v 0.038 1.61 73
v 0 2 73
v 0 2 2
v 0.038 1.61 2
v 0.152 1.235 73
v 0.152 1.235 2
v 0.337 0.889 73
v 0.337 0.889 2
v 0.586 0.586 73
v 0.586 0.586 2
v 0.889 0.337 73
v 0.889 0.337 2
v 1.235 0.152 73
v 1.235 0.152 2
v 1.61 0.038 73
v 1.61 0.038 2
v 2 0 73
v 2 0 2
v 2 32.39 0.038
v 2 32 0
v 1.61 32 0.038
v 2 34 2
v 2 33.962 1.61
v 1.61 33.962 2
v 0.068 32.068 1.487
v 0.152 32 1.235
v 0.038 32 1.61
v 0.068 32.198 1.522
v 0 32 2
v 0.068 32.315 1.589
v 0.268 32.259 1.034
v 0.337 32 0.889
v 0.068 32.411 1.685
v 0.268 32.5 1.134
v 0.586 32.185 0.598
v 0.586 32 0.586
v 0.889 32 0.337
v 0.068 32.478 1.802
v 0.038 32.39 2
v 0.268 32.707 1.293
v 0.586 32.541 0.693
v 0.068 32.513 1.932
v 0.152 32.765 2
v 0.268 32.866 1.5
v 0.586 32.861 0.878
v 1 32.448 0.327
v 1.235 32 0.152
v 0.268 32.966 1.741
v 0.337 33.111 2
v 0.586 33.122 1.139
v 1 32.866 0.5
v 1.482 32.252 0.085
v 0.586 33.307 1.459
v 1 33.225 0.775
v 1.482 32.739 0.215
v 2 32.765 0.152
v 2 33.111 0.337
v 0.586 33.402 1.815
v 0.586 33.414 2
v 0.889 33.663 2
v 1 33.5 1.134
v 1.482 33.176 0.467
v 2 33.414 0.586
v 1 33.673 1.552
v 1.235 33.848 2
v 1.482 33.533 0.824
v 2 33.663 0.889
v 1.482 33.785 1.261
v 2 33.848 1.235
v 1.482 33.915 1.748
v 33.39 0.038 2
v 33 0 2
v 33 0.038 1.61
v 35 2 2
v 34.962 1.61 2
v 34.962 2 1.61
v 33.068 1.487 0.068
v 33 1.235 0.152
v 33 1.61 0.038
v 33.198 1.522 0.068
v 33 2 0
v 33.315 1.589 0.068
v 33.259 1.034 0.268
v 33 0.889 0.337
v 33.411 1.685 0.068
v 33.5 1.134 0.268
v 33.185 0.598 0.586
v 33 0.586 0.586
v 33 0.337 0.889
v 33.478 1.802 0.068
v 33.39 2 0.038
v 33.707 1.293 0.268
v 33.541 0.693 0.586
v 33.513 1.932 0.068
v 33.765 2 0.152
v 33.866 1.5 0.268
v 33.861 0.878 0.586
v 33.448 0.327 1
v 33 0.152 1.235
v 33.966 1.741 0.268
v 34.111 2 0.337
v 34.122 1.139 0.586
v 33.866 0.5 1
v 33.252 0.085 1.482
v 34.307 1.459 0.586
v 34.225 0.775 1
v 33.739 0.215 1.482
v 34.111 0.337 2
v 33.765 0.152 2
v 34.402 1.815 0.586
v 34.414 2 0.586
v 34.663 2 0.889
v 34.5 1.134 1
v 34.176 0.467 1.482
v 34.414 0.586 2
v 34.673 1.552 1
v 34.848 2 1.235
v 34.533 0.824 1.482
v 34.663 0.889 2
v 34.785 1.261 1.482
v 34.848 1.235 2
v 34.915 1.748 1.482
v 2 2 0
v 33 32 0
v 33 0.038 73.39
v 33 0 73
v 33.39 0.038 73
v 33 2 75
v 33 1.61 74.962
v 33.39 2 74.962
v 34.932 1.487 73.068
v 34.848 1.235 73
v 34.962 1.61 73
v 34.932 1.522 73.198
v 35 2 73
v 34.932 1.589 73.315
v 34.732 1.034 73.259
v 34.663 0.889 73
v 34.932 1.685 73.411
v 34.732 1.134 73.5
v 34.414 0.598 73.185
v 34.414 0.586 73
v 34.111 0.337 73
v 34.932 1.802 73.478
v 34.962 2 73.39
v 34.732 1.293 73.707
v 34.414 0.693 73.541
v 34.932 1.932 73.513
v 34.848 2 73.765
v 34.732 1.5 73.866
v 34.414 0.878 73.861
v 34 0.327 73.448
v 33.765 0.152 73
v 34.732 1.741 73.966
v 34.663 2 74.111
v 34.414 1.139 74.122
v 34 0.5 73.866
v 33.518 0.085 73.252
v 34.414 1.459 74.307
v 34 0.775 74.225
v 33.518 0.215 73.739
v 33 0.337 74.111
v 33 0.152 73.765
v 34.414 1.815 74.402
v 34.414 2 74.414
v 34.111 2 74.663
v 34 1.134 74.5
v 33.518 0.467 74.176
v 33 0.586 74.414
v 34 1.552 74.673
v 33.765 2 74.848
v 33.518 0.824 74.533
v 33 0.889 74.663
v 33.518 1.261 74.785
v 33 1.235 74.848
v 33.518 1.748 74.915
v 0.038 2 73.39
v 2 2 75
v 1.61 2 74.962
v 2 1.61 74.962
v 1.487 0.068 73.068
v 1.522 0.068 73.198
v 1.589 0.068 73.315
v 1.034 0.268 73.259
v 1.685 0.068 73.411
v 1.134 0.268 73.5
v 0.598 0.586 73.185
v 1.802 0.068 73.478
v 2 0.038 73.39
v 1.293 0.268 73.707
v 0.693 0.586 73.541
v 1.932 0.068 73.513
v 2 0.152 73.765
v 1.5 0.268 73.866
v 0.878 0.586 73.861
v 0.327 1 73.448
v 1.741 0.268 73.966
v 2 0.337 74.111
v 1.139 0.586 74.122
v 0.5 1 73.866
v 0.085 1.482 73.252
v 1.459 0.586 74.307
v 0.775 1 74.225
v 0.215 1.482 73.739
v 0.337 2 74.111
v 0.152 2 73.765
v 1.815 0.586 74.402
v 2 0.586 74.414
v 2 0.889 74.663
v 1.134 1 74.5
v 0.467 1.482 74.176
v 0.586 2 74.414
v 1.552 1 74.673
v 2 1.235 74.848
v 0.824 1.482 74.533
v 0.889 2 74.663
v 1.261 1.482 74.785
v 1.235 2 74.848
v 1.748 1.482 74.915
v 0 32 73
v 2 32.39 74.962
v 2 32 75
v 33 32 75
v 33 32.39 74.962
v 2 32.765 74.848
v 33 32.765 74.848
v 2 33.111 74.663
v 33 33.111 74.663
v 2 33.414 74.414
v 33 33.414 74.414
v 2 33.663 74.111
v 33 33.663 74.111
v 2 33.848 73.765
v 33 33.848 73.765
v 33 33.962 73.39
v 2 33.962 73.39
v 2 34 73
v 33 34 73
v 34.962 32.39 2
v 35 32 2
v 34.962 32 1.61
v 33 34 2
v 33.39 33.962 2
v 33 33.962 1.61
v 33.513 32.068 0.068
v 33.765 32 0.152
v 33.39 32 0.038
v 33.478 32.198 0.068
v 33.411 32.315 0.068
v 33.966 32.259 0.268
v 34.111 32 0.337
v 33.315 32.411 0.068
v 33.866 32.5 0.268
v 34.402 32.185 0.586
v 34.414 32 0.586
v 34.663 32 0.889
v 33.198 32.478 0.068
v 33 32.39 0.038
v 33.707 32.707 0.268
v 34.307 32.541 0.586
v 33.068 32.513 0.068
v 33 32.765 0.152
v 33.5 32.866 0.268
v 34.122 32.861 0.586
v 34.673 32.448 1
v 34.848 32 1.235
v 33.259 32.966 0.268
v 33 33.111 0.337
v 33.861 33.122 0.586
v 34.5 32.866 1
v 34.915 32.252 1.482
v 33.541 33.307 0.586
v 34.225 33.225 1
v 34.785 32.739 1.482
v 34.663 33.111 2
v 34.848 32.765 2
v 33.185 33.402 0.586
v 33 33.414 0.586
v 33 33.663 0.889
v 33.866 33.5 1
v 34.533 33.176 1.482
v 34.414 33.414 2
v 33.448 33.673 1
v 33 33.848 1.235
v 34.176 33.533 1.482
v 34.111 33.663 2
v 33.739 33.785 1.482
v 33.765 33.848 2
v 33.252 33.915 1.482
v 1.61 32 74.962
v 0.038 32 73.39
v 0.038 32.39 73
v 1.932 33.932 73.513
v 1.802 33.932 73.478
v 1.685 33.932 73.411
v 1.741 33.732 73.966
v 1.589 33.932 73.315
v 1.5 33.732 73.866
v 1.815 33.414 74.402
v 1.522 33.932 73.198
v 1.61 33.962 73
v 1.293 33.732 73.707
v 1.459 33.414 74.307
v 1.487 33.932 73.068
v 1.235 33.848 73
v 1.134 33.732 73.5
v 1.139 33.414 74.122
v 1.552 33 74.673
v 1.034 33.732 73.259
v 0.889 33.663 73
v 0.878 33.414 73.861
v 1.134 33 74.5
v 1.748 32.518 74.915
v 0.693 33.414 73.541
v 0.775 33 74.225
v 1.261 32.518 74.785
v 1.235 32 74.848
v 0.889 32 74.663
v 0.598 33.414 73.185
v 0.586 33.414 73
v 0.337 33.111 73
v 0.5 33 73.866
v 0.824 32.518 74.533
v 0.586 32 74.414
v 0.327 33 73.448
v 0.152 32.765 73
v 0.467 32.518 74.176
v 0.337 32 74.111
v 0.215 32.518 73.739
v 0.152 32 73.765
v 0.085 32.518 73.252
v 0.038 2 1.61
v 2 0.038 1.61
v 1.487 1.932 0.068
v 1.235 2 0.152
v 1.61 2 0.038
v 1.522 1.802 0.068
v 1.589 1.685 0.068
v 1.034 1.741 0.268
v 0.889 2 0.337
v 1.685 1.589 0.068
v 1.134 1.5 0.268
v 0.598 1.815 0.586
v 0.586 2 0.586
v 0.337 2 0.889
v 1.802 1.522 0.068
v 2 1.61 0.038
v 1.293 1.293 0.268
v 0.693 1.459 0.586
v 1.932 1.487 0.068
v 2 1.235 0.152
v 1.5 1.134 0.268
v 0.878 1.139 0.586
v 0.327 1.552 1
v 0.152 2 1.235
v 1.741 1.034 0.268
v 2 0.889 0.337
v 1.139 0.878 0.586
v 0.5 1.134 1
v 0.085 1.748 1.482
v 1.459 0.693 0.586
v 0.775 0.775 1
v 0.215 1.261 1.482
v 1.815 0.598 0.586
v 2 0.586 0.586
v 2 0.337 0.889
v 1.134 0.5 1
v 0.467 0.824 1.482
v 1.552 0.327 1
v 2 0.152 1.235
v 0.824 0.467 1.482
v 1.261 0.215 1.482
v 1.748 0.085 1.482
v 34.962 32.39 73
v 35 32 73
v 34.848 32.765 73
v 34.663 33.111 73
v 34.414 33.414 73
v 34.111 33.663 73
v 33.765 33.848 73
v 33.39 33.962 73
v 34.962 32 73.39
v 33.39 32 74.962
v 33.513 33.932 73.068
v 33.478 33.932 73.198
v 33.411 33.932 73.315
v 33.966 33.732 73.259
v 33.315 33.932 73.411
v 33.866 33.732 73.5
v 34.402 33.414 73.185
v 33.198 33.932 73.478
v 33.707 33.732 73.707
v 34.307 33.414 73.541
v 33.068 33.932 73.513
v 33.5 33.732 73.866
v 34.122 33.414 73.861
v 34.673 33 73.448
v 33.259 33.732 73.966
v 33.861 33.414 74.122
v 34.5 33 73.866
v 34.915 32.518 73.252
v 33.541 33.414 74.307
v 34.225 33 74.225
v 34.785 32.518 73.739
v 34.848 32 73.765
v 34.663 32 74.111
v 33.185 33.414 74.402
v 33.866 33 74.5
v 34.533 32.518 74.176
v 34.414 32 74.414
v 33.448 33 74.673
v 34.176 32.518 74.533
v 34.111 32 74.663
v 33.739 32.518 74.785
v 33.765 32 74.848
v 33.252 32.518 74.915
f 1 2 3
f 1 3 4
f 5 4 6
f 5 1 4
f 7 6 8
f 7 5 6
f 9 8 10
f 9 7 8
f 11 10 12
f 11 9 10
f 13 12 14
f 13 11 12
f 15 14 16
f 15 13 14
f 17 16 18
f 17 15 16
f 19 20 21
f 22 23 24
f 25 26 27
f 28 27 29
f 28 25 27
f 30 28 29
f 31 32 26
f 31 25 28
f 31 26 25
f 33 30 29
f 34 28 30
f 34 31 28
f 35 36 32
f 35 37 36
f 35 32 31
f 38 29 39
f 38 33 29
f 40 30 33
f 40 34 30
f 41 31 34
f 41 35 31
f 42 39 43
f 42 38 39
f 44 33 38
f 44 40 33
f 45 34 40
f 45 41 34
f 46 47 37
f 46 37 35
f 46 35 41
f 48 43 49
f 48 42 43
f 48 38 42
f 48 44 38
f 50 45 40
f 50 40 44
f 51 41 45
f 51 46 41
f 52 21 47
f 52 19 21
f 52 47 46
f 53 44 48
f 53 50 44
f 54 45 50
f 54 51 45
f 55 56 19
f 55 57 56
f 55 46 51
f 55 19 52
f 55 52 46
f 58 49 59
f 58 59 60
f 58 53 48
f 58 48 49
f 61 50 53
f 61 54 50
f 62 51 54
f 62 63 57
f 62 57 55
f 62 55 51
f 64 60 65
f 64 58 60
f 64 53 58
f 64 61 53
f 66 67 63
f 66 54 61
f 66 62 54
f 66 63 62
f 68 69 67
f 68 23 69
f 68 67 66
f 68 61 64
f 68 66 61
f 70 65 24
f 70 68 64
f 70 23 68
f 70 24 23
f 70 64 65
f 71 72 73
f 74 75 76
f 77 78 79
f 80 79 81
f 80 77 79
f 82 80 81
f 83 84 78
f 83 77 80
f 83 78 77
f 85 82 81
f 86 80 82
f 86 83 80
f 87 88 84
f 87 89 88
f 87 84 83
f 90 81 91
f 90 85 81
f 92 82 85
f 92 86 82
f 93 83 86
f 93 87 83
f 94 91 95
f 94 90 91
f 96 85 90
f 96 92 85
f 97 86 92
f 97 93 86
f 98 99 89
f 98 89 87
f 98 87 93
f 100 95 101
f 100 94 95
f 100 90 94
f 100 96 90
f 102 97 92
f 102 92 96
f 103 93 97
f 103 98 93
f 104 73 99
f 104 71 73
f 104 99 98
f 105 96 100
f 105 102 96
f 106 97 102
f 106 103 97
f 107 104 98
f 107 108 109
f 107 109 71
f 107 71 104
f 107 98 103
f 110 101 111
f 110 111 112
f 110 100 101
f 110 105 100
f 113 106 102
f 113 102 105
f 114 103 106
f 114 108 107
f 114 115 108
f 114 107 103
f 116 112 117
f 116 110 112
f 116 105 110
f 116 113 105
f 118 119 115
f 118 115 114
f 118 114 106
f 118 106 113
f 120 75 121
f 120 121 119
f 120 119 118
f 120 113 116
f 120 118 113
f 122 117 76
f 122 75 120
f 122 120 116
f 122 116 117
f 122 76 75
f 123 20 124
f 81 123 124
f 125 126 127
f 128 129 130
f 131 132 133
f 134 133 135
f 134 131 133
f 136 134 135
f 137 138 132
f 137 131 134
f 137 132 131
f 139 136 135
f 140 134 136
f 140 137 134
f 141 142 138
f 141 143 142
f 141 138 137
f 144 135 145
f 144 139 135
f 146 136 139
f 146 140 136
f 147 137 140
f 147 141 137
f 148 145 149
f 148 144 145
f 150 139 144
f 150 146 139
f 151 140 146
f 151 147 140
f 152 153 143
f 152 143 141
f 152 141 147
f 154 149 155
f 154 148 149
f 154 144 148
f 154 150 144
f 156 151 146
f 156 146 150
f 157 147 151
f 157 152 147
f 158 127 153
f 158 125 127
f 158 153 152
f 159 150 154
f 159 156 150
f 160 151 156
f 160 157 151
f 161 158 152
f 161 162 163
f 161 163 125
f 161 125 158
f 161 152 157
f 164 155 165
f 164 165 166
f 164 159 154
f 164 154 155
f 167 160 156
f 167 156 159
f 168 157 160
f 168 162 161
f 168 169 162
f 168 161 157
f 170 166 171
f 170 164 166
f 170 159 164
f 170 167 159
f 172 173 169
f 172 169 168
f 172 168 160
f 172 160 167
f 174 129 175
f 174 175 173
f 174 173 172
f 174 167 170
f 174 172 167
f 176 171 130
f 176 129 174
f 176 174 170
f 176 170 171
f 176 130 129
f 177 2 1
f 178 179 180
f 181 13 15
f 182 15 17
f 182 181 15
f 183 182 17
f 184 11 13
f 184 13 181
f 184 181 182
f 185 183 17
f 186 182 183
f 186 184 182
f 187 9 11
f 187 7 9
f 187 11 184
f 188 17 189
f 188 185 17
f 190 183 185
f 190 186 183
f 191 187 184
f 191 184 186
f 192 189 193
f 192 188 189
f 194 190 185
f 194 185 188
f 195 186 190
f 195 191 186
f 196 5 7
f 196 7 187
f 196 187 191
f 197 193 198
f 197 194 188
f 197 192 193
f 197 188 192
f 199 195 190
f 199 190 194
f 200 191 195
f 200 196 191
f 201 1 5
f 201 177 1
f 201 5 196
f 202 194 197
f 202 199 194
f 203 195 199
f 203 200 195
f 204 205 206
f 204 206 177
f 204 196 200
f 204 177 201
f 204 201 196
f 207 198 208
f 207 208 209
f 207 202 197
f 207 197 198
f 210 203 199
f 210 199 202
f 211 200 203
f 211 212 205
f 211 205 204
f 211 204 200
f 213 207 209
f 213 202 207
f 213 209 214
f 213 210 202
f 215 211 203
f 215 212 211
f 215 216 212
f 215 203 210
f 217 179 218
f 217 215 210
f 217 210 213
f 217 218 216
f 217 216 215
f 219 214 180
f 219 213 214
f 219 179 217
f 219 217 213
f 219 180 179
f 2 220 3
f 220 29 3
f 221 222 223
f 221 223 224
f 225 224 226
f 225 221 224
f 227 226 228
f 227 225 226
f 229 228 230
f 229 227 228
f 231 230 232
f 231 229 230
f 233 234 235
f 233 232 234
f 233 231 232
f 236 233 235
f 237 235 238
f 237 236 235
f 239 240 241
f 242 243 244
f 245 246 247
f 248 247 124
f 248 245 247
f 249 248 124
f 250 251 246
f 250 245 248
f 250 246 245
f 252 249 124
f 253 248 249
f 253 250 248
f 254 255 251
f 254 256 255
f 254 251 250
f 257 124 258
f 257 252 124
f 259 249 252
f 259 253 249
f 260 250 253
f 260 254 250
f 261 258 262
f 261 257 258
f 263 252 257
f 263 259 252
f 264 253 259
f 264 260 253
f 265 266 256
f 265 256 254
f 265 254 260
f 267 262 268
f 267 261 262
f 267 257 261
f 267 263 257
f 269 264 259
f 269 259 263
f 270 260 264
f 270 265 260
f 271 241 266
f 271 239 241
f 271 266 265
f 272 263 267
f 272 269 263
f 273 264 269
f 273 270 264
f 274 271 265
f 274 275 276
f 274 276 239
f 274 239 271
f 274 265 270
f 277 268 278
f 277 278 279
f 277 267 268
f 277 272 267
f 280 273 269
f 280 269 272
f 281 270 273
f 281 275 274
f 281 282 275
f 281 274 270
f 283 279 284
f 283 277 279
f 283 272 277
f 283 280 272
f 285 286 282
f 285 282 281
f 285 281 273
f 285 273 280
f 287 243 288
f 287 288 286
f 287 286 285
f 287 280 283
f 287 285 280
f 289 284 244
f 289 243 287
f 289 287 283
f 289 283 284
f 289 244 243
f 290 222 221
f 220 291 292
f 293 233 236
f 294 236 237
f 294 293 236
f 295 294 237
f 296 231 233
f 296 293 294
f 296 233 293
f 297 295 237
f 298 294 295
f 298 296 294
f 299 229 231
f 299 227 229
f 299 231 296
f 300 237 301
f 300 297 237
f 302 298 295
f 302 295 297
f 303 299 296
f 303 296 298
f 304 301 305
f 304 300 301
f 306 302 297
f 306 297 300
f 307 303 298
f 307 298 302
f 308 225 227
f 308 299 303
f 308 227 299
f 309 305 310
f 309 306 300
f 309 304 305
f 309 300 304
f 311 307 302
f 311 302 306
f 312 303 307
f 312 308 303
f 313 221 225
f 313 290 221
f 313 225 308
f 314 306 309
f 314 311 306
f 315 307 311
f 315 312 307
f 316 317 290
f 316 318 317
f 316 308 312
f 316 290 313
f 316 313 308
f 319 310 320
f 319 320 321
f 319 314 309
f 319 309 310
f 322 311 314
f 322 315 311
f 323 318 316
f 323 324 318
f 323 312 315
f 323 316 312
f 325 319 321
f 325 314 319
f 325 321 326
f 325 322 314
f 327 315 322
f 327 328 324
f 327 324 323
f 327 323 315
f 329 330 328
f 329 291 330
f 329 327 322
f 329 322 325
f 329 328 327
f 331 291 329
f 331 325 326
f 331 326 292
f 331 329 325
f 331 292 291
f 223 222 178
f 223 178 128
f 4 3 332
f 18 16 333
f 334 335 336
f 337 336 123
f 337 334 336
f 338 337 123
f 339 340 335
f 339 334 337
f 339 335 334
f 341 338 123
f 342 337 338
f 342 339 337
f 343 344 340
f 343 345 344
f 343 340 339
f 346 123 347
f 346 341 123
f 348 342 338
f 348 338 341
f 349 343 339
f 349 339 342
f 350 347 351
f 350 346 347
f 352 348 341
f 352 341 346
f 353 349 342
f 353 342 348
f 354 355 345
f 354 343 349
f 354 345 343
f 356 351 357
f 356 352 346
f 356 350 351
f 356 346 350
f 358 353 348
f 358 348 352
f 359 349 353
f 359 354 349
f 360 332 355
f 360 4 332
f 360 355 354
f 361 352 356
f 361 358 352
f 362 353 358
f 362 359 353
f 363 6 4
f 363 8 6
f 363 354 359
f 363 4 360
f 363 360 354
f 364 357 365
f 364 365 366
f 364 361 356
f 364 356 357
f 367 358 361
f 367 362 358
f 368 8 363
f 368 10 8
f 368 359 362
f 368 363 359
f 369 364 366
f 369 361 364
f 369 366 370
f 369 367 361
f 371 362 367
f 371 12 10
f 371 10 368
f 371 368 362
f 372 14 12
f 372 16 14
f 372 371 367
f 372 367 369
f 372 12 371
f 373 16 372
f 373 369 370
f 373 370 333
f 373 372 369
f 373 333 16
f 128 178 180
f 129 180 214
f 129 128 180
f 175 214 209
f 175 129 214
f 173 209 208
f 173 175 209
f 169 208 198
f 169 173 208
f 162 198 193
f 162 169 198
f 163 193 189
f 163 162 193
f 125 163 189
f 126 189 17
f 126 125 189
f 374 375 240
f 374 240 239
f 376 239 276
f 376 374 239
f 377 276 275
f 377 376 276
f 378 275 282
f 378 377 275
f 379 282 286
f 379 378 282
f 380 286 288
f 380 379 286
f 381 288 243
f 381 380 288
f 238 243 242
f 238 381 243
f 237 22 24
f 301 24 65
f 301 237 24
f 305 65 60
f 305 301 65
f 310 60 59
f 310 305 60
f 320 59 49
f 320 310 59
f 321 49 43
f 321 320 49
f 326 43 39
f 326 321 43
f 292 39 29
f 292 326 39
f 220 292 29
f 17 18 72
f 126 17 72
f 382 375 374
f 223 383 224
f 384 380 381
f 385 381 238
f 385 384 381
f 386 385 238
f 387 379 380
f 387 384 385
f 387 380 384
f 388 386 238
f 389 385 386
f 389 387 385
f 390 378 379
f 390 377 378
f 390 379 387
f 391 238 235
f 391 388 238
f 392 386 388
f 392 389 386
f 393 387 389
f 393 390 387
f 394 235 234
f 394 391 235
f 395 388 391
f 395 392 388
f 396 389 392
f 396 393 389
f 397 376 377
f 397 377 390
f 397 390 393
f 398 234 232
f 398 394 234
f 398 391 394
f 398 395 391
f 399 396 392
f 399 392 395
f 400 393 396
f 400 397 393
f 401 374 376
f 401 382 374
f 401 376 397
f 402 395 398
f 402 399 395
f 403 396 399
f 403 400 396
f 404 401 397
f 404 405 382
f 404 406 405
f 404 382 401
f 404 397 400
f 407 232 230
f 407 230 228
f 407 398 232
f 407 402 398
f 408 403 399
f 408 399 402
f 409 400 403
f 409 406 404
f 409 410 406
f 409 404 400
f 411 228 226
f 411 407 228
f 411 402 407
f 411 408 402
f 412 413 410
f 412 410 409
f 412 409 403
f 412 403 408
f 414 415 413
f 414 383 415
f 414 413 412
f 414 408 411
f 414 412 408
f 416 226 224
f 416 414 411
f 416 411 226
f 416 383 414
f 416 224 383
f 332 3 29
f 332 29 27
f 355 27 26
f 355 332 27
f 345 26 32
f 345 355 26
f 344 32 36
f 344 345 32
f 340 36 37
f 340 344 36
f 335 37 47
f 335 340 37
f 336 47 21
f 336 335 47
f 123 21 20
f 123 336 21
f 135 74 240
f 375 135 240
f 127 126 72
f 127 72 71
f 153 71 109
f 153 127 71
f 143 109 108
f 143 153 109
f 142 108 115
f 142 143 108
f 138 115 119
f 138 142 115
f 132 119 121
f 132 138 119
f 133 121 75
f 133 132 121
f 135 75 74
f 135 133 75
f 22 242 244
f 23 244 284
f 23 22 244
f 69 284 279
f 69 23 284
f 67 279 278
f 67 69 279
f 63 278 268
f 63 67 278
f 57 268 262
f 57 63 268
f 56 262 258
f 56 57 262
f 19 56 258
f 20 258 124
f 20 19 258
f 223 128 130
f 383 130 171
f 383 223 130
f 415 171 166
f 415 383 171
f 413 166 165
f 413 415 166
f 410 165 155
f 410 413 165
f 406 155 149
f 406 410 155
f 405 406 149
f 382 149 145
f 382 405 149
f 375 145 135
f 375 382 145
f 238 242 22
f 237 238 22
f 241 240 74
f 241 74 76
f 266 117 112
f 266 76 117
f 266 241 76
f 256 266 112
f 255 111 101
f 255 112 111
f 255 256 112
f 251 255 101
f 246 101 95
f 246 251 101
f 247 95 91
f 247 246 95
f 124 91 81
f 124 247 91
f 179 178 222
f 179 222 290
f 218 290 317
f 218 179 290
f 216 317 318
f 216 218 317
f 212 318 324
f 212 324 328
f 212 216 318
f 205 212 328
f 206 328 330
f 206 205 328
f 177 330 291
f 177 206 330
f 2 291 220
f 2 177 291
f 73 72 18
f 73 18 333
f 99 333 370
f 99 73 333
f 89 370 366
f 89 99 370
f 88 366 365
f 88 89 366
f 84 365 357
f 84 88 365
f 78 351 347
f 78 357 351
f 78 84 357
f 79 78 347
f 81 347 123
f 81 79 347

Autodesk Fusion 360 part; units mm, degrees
sketch "Sketch1" plane through (0, 0, 0) normal (0, 0, 1) x (1, 0, 0)
  line L0 (0, 0) -> (35, 0)
  line L1 (35, 0) -> (35, 34)
  line L2 (35, 34) -> (0, 34)
  line L3 (0, 34) -> (0, 0)
  dimension "d1" = 35
  dimension "d2" = 34
extrude "Extrude1" add sketch "Sketch1" along normal blind 75
fillet "Fillet1" radius 2 12 edges at (0, 17, 75) (17.5, 0, 75) (0, 0, 37.5) (35, 17, 75) (35, 34, 37.5) (17.5, 34, 0) (35, 0, 37.5) (17.5, 34, 75) (0, 17, 0) (35, 17, 0) (0, 34, 37.5) (17.5, 0, 0) 6 faces at (11.6667, 22.6667, 0) (0, 22.6667, 50) (23.3333, 34, 25) (11.6667, 0, 25) (11.6667, 22.6667, 75) (35, 11.3333, 50)
